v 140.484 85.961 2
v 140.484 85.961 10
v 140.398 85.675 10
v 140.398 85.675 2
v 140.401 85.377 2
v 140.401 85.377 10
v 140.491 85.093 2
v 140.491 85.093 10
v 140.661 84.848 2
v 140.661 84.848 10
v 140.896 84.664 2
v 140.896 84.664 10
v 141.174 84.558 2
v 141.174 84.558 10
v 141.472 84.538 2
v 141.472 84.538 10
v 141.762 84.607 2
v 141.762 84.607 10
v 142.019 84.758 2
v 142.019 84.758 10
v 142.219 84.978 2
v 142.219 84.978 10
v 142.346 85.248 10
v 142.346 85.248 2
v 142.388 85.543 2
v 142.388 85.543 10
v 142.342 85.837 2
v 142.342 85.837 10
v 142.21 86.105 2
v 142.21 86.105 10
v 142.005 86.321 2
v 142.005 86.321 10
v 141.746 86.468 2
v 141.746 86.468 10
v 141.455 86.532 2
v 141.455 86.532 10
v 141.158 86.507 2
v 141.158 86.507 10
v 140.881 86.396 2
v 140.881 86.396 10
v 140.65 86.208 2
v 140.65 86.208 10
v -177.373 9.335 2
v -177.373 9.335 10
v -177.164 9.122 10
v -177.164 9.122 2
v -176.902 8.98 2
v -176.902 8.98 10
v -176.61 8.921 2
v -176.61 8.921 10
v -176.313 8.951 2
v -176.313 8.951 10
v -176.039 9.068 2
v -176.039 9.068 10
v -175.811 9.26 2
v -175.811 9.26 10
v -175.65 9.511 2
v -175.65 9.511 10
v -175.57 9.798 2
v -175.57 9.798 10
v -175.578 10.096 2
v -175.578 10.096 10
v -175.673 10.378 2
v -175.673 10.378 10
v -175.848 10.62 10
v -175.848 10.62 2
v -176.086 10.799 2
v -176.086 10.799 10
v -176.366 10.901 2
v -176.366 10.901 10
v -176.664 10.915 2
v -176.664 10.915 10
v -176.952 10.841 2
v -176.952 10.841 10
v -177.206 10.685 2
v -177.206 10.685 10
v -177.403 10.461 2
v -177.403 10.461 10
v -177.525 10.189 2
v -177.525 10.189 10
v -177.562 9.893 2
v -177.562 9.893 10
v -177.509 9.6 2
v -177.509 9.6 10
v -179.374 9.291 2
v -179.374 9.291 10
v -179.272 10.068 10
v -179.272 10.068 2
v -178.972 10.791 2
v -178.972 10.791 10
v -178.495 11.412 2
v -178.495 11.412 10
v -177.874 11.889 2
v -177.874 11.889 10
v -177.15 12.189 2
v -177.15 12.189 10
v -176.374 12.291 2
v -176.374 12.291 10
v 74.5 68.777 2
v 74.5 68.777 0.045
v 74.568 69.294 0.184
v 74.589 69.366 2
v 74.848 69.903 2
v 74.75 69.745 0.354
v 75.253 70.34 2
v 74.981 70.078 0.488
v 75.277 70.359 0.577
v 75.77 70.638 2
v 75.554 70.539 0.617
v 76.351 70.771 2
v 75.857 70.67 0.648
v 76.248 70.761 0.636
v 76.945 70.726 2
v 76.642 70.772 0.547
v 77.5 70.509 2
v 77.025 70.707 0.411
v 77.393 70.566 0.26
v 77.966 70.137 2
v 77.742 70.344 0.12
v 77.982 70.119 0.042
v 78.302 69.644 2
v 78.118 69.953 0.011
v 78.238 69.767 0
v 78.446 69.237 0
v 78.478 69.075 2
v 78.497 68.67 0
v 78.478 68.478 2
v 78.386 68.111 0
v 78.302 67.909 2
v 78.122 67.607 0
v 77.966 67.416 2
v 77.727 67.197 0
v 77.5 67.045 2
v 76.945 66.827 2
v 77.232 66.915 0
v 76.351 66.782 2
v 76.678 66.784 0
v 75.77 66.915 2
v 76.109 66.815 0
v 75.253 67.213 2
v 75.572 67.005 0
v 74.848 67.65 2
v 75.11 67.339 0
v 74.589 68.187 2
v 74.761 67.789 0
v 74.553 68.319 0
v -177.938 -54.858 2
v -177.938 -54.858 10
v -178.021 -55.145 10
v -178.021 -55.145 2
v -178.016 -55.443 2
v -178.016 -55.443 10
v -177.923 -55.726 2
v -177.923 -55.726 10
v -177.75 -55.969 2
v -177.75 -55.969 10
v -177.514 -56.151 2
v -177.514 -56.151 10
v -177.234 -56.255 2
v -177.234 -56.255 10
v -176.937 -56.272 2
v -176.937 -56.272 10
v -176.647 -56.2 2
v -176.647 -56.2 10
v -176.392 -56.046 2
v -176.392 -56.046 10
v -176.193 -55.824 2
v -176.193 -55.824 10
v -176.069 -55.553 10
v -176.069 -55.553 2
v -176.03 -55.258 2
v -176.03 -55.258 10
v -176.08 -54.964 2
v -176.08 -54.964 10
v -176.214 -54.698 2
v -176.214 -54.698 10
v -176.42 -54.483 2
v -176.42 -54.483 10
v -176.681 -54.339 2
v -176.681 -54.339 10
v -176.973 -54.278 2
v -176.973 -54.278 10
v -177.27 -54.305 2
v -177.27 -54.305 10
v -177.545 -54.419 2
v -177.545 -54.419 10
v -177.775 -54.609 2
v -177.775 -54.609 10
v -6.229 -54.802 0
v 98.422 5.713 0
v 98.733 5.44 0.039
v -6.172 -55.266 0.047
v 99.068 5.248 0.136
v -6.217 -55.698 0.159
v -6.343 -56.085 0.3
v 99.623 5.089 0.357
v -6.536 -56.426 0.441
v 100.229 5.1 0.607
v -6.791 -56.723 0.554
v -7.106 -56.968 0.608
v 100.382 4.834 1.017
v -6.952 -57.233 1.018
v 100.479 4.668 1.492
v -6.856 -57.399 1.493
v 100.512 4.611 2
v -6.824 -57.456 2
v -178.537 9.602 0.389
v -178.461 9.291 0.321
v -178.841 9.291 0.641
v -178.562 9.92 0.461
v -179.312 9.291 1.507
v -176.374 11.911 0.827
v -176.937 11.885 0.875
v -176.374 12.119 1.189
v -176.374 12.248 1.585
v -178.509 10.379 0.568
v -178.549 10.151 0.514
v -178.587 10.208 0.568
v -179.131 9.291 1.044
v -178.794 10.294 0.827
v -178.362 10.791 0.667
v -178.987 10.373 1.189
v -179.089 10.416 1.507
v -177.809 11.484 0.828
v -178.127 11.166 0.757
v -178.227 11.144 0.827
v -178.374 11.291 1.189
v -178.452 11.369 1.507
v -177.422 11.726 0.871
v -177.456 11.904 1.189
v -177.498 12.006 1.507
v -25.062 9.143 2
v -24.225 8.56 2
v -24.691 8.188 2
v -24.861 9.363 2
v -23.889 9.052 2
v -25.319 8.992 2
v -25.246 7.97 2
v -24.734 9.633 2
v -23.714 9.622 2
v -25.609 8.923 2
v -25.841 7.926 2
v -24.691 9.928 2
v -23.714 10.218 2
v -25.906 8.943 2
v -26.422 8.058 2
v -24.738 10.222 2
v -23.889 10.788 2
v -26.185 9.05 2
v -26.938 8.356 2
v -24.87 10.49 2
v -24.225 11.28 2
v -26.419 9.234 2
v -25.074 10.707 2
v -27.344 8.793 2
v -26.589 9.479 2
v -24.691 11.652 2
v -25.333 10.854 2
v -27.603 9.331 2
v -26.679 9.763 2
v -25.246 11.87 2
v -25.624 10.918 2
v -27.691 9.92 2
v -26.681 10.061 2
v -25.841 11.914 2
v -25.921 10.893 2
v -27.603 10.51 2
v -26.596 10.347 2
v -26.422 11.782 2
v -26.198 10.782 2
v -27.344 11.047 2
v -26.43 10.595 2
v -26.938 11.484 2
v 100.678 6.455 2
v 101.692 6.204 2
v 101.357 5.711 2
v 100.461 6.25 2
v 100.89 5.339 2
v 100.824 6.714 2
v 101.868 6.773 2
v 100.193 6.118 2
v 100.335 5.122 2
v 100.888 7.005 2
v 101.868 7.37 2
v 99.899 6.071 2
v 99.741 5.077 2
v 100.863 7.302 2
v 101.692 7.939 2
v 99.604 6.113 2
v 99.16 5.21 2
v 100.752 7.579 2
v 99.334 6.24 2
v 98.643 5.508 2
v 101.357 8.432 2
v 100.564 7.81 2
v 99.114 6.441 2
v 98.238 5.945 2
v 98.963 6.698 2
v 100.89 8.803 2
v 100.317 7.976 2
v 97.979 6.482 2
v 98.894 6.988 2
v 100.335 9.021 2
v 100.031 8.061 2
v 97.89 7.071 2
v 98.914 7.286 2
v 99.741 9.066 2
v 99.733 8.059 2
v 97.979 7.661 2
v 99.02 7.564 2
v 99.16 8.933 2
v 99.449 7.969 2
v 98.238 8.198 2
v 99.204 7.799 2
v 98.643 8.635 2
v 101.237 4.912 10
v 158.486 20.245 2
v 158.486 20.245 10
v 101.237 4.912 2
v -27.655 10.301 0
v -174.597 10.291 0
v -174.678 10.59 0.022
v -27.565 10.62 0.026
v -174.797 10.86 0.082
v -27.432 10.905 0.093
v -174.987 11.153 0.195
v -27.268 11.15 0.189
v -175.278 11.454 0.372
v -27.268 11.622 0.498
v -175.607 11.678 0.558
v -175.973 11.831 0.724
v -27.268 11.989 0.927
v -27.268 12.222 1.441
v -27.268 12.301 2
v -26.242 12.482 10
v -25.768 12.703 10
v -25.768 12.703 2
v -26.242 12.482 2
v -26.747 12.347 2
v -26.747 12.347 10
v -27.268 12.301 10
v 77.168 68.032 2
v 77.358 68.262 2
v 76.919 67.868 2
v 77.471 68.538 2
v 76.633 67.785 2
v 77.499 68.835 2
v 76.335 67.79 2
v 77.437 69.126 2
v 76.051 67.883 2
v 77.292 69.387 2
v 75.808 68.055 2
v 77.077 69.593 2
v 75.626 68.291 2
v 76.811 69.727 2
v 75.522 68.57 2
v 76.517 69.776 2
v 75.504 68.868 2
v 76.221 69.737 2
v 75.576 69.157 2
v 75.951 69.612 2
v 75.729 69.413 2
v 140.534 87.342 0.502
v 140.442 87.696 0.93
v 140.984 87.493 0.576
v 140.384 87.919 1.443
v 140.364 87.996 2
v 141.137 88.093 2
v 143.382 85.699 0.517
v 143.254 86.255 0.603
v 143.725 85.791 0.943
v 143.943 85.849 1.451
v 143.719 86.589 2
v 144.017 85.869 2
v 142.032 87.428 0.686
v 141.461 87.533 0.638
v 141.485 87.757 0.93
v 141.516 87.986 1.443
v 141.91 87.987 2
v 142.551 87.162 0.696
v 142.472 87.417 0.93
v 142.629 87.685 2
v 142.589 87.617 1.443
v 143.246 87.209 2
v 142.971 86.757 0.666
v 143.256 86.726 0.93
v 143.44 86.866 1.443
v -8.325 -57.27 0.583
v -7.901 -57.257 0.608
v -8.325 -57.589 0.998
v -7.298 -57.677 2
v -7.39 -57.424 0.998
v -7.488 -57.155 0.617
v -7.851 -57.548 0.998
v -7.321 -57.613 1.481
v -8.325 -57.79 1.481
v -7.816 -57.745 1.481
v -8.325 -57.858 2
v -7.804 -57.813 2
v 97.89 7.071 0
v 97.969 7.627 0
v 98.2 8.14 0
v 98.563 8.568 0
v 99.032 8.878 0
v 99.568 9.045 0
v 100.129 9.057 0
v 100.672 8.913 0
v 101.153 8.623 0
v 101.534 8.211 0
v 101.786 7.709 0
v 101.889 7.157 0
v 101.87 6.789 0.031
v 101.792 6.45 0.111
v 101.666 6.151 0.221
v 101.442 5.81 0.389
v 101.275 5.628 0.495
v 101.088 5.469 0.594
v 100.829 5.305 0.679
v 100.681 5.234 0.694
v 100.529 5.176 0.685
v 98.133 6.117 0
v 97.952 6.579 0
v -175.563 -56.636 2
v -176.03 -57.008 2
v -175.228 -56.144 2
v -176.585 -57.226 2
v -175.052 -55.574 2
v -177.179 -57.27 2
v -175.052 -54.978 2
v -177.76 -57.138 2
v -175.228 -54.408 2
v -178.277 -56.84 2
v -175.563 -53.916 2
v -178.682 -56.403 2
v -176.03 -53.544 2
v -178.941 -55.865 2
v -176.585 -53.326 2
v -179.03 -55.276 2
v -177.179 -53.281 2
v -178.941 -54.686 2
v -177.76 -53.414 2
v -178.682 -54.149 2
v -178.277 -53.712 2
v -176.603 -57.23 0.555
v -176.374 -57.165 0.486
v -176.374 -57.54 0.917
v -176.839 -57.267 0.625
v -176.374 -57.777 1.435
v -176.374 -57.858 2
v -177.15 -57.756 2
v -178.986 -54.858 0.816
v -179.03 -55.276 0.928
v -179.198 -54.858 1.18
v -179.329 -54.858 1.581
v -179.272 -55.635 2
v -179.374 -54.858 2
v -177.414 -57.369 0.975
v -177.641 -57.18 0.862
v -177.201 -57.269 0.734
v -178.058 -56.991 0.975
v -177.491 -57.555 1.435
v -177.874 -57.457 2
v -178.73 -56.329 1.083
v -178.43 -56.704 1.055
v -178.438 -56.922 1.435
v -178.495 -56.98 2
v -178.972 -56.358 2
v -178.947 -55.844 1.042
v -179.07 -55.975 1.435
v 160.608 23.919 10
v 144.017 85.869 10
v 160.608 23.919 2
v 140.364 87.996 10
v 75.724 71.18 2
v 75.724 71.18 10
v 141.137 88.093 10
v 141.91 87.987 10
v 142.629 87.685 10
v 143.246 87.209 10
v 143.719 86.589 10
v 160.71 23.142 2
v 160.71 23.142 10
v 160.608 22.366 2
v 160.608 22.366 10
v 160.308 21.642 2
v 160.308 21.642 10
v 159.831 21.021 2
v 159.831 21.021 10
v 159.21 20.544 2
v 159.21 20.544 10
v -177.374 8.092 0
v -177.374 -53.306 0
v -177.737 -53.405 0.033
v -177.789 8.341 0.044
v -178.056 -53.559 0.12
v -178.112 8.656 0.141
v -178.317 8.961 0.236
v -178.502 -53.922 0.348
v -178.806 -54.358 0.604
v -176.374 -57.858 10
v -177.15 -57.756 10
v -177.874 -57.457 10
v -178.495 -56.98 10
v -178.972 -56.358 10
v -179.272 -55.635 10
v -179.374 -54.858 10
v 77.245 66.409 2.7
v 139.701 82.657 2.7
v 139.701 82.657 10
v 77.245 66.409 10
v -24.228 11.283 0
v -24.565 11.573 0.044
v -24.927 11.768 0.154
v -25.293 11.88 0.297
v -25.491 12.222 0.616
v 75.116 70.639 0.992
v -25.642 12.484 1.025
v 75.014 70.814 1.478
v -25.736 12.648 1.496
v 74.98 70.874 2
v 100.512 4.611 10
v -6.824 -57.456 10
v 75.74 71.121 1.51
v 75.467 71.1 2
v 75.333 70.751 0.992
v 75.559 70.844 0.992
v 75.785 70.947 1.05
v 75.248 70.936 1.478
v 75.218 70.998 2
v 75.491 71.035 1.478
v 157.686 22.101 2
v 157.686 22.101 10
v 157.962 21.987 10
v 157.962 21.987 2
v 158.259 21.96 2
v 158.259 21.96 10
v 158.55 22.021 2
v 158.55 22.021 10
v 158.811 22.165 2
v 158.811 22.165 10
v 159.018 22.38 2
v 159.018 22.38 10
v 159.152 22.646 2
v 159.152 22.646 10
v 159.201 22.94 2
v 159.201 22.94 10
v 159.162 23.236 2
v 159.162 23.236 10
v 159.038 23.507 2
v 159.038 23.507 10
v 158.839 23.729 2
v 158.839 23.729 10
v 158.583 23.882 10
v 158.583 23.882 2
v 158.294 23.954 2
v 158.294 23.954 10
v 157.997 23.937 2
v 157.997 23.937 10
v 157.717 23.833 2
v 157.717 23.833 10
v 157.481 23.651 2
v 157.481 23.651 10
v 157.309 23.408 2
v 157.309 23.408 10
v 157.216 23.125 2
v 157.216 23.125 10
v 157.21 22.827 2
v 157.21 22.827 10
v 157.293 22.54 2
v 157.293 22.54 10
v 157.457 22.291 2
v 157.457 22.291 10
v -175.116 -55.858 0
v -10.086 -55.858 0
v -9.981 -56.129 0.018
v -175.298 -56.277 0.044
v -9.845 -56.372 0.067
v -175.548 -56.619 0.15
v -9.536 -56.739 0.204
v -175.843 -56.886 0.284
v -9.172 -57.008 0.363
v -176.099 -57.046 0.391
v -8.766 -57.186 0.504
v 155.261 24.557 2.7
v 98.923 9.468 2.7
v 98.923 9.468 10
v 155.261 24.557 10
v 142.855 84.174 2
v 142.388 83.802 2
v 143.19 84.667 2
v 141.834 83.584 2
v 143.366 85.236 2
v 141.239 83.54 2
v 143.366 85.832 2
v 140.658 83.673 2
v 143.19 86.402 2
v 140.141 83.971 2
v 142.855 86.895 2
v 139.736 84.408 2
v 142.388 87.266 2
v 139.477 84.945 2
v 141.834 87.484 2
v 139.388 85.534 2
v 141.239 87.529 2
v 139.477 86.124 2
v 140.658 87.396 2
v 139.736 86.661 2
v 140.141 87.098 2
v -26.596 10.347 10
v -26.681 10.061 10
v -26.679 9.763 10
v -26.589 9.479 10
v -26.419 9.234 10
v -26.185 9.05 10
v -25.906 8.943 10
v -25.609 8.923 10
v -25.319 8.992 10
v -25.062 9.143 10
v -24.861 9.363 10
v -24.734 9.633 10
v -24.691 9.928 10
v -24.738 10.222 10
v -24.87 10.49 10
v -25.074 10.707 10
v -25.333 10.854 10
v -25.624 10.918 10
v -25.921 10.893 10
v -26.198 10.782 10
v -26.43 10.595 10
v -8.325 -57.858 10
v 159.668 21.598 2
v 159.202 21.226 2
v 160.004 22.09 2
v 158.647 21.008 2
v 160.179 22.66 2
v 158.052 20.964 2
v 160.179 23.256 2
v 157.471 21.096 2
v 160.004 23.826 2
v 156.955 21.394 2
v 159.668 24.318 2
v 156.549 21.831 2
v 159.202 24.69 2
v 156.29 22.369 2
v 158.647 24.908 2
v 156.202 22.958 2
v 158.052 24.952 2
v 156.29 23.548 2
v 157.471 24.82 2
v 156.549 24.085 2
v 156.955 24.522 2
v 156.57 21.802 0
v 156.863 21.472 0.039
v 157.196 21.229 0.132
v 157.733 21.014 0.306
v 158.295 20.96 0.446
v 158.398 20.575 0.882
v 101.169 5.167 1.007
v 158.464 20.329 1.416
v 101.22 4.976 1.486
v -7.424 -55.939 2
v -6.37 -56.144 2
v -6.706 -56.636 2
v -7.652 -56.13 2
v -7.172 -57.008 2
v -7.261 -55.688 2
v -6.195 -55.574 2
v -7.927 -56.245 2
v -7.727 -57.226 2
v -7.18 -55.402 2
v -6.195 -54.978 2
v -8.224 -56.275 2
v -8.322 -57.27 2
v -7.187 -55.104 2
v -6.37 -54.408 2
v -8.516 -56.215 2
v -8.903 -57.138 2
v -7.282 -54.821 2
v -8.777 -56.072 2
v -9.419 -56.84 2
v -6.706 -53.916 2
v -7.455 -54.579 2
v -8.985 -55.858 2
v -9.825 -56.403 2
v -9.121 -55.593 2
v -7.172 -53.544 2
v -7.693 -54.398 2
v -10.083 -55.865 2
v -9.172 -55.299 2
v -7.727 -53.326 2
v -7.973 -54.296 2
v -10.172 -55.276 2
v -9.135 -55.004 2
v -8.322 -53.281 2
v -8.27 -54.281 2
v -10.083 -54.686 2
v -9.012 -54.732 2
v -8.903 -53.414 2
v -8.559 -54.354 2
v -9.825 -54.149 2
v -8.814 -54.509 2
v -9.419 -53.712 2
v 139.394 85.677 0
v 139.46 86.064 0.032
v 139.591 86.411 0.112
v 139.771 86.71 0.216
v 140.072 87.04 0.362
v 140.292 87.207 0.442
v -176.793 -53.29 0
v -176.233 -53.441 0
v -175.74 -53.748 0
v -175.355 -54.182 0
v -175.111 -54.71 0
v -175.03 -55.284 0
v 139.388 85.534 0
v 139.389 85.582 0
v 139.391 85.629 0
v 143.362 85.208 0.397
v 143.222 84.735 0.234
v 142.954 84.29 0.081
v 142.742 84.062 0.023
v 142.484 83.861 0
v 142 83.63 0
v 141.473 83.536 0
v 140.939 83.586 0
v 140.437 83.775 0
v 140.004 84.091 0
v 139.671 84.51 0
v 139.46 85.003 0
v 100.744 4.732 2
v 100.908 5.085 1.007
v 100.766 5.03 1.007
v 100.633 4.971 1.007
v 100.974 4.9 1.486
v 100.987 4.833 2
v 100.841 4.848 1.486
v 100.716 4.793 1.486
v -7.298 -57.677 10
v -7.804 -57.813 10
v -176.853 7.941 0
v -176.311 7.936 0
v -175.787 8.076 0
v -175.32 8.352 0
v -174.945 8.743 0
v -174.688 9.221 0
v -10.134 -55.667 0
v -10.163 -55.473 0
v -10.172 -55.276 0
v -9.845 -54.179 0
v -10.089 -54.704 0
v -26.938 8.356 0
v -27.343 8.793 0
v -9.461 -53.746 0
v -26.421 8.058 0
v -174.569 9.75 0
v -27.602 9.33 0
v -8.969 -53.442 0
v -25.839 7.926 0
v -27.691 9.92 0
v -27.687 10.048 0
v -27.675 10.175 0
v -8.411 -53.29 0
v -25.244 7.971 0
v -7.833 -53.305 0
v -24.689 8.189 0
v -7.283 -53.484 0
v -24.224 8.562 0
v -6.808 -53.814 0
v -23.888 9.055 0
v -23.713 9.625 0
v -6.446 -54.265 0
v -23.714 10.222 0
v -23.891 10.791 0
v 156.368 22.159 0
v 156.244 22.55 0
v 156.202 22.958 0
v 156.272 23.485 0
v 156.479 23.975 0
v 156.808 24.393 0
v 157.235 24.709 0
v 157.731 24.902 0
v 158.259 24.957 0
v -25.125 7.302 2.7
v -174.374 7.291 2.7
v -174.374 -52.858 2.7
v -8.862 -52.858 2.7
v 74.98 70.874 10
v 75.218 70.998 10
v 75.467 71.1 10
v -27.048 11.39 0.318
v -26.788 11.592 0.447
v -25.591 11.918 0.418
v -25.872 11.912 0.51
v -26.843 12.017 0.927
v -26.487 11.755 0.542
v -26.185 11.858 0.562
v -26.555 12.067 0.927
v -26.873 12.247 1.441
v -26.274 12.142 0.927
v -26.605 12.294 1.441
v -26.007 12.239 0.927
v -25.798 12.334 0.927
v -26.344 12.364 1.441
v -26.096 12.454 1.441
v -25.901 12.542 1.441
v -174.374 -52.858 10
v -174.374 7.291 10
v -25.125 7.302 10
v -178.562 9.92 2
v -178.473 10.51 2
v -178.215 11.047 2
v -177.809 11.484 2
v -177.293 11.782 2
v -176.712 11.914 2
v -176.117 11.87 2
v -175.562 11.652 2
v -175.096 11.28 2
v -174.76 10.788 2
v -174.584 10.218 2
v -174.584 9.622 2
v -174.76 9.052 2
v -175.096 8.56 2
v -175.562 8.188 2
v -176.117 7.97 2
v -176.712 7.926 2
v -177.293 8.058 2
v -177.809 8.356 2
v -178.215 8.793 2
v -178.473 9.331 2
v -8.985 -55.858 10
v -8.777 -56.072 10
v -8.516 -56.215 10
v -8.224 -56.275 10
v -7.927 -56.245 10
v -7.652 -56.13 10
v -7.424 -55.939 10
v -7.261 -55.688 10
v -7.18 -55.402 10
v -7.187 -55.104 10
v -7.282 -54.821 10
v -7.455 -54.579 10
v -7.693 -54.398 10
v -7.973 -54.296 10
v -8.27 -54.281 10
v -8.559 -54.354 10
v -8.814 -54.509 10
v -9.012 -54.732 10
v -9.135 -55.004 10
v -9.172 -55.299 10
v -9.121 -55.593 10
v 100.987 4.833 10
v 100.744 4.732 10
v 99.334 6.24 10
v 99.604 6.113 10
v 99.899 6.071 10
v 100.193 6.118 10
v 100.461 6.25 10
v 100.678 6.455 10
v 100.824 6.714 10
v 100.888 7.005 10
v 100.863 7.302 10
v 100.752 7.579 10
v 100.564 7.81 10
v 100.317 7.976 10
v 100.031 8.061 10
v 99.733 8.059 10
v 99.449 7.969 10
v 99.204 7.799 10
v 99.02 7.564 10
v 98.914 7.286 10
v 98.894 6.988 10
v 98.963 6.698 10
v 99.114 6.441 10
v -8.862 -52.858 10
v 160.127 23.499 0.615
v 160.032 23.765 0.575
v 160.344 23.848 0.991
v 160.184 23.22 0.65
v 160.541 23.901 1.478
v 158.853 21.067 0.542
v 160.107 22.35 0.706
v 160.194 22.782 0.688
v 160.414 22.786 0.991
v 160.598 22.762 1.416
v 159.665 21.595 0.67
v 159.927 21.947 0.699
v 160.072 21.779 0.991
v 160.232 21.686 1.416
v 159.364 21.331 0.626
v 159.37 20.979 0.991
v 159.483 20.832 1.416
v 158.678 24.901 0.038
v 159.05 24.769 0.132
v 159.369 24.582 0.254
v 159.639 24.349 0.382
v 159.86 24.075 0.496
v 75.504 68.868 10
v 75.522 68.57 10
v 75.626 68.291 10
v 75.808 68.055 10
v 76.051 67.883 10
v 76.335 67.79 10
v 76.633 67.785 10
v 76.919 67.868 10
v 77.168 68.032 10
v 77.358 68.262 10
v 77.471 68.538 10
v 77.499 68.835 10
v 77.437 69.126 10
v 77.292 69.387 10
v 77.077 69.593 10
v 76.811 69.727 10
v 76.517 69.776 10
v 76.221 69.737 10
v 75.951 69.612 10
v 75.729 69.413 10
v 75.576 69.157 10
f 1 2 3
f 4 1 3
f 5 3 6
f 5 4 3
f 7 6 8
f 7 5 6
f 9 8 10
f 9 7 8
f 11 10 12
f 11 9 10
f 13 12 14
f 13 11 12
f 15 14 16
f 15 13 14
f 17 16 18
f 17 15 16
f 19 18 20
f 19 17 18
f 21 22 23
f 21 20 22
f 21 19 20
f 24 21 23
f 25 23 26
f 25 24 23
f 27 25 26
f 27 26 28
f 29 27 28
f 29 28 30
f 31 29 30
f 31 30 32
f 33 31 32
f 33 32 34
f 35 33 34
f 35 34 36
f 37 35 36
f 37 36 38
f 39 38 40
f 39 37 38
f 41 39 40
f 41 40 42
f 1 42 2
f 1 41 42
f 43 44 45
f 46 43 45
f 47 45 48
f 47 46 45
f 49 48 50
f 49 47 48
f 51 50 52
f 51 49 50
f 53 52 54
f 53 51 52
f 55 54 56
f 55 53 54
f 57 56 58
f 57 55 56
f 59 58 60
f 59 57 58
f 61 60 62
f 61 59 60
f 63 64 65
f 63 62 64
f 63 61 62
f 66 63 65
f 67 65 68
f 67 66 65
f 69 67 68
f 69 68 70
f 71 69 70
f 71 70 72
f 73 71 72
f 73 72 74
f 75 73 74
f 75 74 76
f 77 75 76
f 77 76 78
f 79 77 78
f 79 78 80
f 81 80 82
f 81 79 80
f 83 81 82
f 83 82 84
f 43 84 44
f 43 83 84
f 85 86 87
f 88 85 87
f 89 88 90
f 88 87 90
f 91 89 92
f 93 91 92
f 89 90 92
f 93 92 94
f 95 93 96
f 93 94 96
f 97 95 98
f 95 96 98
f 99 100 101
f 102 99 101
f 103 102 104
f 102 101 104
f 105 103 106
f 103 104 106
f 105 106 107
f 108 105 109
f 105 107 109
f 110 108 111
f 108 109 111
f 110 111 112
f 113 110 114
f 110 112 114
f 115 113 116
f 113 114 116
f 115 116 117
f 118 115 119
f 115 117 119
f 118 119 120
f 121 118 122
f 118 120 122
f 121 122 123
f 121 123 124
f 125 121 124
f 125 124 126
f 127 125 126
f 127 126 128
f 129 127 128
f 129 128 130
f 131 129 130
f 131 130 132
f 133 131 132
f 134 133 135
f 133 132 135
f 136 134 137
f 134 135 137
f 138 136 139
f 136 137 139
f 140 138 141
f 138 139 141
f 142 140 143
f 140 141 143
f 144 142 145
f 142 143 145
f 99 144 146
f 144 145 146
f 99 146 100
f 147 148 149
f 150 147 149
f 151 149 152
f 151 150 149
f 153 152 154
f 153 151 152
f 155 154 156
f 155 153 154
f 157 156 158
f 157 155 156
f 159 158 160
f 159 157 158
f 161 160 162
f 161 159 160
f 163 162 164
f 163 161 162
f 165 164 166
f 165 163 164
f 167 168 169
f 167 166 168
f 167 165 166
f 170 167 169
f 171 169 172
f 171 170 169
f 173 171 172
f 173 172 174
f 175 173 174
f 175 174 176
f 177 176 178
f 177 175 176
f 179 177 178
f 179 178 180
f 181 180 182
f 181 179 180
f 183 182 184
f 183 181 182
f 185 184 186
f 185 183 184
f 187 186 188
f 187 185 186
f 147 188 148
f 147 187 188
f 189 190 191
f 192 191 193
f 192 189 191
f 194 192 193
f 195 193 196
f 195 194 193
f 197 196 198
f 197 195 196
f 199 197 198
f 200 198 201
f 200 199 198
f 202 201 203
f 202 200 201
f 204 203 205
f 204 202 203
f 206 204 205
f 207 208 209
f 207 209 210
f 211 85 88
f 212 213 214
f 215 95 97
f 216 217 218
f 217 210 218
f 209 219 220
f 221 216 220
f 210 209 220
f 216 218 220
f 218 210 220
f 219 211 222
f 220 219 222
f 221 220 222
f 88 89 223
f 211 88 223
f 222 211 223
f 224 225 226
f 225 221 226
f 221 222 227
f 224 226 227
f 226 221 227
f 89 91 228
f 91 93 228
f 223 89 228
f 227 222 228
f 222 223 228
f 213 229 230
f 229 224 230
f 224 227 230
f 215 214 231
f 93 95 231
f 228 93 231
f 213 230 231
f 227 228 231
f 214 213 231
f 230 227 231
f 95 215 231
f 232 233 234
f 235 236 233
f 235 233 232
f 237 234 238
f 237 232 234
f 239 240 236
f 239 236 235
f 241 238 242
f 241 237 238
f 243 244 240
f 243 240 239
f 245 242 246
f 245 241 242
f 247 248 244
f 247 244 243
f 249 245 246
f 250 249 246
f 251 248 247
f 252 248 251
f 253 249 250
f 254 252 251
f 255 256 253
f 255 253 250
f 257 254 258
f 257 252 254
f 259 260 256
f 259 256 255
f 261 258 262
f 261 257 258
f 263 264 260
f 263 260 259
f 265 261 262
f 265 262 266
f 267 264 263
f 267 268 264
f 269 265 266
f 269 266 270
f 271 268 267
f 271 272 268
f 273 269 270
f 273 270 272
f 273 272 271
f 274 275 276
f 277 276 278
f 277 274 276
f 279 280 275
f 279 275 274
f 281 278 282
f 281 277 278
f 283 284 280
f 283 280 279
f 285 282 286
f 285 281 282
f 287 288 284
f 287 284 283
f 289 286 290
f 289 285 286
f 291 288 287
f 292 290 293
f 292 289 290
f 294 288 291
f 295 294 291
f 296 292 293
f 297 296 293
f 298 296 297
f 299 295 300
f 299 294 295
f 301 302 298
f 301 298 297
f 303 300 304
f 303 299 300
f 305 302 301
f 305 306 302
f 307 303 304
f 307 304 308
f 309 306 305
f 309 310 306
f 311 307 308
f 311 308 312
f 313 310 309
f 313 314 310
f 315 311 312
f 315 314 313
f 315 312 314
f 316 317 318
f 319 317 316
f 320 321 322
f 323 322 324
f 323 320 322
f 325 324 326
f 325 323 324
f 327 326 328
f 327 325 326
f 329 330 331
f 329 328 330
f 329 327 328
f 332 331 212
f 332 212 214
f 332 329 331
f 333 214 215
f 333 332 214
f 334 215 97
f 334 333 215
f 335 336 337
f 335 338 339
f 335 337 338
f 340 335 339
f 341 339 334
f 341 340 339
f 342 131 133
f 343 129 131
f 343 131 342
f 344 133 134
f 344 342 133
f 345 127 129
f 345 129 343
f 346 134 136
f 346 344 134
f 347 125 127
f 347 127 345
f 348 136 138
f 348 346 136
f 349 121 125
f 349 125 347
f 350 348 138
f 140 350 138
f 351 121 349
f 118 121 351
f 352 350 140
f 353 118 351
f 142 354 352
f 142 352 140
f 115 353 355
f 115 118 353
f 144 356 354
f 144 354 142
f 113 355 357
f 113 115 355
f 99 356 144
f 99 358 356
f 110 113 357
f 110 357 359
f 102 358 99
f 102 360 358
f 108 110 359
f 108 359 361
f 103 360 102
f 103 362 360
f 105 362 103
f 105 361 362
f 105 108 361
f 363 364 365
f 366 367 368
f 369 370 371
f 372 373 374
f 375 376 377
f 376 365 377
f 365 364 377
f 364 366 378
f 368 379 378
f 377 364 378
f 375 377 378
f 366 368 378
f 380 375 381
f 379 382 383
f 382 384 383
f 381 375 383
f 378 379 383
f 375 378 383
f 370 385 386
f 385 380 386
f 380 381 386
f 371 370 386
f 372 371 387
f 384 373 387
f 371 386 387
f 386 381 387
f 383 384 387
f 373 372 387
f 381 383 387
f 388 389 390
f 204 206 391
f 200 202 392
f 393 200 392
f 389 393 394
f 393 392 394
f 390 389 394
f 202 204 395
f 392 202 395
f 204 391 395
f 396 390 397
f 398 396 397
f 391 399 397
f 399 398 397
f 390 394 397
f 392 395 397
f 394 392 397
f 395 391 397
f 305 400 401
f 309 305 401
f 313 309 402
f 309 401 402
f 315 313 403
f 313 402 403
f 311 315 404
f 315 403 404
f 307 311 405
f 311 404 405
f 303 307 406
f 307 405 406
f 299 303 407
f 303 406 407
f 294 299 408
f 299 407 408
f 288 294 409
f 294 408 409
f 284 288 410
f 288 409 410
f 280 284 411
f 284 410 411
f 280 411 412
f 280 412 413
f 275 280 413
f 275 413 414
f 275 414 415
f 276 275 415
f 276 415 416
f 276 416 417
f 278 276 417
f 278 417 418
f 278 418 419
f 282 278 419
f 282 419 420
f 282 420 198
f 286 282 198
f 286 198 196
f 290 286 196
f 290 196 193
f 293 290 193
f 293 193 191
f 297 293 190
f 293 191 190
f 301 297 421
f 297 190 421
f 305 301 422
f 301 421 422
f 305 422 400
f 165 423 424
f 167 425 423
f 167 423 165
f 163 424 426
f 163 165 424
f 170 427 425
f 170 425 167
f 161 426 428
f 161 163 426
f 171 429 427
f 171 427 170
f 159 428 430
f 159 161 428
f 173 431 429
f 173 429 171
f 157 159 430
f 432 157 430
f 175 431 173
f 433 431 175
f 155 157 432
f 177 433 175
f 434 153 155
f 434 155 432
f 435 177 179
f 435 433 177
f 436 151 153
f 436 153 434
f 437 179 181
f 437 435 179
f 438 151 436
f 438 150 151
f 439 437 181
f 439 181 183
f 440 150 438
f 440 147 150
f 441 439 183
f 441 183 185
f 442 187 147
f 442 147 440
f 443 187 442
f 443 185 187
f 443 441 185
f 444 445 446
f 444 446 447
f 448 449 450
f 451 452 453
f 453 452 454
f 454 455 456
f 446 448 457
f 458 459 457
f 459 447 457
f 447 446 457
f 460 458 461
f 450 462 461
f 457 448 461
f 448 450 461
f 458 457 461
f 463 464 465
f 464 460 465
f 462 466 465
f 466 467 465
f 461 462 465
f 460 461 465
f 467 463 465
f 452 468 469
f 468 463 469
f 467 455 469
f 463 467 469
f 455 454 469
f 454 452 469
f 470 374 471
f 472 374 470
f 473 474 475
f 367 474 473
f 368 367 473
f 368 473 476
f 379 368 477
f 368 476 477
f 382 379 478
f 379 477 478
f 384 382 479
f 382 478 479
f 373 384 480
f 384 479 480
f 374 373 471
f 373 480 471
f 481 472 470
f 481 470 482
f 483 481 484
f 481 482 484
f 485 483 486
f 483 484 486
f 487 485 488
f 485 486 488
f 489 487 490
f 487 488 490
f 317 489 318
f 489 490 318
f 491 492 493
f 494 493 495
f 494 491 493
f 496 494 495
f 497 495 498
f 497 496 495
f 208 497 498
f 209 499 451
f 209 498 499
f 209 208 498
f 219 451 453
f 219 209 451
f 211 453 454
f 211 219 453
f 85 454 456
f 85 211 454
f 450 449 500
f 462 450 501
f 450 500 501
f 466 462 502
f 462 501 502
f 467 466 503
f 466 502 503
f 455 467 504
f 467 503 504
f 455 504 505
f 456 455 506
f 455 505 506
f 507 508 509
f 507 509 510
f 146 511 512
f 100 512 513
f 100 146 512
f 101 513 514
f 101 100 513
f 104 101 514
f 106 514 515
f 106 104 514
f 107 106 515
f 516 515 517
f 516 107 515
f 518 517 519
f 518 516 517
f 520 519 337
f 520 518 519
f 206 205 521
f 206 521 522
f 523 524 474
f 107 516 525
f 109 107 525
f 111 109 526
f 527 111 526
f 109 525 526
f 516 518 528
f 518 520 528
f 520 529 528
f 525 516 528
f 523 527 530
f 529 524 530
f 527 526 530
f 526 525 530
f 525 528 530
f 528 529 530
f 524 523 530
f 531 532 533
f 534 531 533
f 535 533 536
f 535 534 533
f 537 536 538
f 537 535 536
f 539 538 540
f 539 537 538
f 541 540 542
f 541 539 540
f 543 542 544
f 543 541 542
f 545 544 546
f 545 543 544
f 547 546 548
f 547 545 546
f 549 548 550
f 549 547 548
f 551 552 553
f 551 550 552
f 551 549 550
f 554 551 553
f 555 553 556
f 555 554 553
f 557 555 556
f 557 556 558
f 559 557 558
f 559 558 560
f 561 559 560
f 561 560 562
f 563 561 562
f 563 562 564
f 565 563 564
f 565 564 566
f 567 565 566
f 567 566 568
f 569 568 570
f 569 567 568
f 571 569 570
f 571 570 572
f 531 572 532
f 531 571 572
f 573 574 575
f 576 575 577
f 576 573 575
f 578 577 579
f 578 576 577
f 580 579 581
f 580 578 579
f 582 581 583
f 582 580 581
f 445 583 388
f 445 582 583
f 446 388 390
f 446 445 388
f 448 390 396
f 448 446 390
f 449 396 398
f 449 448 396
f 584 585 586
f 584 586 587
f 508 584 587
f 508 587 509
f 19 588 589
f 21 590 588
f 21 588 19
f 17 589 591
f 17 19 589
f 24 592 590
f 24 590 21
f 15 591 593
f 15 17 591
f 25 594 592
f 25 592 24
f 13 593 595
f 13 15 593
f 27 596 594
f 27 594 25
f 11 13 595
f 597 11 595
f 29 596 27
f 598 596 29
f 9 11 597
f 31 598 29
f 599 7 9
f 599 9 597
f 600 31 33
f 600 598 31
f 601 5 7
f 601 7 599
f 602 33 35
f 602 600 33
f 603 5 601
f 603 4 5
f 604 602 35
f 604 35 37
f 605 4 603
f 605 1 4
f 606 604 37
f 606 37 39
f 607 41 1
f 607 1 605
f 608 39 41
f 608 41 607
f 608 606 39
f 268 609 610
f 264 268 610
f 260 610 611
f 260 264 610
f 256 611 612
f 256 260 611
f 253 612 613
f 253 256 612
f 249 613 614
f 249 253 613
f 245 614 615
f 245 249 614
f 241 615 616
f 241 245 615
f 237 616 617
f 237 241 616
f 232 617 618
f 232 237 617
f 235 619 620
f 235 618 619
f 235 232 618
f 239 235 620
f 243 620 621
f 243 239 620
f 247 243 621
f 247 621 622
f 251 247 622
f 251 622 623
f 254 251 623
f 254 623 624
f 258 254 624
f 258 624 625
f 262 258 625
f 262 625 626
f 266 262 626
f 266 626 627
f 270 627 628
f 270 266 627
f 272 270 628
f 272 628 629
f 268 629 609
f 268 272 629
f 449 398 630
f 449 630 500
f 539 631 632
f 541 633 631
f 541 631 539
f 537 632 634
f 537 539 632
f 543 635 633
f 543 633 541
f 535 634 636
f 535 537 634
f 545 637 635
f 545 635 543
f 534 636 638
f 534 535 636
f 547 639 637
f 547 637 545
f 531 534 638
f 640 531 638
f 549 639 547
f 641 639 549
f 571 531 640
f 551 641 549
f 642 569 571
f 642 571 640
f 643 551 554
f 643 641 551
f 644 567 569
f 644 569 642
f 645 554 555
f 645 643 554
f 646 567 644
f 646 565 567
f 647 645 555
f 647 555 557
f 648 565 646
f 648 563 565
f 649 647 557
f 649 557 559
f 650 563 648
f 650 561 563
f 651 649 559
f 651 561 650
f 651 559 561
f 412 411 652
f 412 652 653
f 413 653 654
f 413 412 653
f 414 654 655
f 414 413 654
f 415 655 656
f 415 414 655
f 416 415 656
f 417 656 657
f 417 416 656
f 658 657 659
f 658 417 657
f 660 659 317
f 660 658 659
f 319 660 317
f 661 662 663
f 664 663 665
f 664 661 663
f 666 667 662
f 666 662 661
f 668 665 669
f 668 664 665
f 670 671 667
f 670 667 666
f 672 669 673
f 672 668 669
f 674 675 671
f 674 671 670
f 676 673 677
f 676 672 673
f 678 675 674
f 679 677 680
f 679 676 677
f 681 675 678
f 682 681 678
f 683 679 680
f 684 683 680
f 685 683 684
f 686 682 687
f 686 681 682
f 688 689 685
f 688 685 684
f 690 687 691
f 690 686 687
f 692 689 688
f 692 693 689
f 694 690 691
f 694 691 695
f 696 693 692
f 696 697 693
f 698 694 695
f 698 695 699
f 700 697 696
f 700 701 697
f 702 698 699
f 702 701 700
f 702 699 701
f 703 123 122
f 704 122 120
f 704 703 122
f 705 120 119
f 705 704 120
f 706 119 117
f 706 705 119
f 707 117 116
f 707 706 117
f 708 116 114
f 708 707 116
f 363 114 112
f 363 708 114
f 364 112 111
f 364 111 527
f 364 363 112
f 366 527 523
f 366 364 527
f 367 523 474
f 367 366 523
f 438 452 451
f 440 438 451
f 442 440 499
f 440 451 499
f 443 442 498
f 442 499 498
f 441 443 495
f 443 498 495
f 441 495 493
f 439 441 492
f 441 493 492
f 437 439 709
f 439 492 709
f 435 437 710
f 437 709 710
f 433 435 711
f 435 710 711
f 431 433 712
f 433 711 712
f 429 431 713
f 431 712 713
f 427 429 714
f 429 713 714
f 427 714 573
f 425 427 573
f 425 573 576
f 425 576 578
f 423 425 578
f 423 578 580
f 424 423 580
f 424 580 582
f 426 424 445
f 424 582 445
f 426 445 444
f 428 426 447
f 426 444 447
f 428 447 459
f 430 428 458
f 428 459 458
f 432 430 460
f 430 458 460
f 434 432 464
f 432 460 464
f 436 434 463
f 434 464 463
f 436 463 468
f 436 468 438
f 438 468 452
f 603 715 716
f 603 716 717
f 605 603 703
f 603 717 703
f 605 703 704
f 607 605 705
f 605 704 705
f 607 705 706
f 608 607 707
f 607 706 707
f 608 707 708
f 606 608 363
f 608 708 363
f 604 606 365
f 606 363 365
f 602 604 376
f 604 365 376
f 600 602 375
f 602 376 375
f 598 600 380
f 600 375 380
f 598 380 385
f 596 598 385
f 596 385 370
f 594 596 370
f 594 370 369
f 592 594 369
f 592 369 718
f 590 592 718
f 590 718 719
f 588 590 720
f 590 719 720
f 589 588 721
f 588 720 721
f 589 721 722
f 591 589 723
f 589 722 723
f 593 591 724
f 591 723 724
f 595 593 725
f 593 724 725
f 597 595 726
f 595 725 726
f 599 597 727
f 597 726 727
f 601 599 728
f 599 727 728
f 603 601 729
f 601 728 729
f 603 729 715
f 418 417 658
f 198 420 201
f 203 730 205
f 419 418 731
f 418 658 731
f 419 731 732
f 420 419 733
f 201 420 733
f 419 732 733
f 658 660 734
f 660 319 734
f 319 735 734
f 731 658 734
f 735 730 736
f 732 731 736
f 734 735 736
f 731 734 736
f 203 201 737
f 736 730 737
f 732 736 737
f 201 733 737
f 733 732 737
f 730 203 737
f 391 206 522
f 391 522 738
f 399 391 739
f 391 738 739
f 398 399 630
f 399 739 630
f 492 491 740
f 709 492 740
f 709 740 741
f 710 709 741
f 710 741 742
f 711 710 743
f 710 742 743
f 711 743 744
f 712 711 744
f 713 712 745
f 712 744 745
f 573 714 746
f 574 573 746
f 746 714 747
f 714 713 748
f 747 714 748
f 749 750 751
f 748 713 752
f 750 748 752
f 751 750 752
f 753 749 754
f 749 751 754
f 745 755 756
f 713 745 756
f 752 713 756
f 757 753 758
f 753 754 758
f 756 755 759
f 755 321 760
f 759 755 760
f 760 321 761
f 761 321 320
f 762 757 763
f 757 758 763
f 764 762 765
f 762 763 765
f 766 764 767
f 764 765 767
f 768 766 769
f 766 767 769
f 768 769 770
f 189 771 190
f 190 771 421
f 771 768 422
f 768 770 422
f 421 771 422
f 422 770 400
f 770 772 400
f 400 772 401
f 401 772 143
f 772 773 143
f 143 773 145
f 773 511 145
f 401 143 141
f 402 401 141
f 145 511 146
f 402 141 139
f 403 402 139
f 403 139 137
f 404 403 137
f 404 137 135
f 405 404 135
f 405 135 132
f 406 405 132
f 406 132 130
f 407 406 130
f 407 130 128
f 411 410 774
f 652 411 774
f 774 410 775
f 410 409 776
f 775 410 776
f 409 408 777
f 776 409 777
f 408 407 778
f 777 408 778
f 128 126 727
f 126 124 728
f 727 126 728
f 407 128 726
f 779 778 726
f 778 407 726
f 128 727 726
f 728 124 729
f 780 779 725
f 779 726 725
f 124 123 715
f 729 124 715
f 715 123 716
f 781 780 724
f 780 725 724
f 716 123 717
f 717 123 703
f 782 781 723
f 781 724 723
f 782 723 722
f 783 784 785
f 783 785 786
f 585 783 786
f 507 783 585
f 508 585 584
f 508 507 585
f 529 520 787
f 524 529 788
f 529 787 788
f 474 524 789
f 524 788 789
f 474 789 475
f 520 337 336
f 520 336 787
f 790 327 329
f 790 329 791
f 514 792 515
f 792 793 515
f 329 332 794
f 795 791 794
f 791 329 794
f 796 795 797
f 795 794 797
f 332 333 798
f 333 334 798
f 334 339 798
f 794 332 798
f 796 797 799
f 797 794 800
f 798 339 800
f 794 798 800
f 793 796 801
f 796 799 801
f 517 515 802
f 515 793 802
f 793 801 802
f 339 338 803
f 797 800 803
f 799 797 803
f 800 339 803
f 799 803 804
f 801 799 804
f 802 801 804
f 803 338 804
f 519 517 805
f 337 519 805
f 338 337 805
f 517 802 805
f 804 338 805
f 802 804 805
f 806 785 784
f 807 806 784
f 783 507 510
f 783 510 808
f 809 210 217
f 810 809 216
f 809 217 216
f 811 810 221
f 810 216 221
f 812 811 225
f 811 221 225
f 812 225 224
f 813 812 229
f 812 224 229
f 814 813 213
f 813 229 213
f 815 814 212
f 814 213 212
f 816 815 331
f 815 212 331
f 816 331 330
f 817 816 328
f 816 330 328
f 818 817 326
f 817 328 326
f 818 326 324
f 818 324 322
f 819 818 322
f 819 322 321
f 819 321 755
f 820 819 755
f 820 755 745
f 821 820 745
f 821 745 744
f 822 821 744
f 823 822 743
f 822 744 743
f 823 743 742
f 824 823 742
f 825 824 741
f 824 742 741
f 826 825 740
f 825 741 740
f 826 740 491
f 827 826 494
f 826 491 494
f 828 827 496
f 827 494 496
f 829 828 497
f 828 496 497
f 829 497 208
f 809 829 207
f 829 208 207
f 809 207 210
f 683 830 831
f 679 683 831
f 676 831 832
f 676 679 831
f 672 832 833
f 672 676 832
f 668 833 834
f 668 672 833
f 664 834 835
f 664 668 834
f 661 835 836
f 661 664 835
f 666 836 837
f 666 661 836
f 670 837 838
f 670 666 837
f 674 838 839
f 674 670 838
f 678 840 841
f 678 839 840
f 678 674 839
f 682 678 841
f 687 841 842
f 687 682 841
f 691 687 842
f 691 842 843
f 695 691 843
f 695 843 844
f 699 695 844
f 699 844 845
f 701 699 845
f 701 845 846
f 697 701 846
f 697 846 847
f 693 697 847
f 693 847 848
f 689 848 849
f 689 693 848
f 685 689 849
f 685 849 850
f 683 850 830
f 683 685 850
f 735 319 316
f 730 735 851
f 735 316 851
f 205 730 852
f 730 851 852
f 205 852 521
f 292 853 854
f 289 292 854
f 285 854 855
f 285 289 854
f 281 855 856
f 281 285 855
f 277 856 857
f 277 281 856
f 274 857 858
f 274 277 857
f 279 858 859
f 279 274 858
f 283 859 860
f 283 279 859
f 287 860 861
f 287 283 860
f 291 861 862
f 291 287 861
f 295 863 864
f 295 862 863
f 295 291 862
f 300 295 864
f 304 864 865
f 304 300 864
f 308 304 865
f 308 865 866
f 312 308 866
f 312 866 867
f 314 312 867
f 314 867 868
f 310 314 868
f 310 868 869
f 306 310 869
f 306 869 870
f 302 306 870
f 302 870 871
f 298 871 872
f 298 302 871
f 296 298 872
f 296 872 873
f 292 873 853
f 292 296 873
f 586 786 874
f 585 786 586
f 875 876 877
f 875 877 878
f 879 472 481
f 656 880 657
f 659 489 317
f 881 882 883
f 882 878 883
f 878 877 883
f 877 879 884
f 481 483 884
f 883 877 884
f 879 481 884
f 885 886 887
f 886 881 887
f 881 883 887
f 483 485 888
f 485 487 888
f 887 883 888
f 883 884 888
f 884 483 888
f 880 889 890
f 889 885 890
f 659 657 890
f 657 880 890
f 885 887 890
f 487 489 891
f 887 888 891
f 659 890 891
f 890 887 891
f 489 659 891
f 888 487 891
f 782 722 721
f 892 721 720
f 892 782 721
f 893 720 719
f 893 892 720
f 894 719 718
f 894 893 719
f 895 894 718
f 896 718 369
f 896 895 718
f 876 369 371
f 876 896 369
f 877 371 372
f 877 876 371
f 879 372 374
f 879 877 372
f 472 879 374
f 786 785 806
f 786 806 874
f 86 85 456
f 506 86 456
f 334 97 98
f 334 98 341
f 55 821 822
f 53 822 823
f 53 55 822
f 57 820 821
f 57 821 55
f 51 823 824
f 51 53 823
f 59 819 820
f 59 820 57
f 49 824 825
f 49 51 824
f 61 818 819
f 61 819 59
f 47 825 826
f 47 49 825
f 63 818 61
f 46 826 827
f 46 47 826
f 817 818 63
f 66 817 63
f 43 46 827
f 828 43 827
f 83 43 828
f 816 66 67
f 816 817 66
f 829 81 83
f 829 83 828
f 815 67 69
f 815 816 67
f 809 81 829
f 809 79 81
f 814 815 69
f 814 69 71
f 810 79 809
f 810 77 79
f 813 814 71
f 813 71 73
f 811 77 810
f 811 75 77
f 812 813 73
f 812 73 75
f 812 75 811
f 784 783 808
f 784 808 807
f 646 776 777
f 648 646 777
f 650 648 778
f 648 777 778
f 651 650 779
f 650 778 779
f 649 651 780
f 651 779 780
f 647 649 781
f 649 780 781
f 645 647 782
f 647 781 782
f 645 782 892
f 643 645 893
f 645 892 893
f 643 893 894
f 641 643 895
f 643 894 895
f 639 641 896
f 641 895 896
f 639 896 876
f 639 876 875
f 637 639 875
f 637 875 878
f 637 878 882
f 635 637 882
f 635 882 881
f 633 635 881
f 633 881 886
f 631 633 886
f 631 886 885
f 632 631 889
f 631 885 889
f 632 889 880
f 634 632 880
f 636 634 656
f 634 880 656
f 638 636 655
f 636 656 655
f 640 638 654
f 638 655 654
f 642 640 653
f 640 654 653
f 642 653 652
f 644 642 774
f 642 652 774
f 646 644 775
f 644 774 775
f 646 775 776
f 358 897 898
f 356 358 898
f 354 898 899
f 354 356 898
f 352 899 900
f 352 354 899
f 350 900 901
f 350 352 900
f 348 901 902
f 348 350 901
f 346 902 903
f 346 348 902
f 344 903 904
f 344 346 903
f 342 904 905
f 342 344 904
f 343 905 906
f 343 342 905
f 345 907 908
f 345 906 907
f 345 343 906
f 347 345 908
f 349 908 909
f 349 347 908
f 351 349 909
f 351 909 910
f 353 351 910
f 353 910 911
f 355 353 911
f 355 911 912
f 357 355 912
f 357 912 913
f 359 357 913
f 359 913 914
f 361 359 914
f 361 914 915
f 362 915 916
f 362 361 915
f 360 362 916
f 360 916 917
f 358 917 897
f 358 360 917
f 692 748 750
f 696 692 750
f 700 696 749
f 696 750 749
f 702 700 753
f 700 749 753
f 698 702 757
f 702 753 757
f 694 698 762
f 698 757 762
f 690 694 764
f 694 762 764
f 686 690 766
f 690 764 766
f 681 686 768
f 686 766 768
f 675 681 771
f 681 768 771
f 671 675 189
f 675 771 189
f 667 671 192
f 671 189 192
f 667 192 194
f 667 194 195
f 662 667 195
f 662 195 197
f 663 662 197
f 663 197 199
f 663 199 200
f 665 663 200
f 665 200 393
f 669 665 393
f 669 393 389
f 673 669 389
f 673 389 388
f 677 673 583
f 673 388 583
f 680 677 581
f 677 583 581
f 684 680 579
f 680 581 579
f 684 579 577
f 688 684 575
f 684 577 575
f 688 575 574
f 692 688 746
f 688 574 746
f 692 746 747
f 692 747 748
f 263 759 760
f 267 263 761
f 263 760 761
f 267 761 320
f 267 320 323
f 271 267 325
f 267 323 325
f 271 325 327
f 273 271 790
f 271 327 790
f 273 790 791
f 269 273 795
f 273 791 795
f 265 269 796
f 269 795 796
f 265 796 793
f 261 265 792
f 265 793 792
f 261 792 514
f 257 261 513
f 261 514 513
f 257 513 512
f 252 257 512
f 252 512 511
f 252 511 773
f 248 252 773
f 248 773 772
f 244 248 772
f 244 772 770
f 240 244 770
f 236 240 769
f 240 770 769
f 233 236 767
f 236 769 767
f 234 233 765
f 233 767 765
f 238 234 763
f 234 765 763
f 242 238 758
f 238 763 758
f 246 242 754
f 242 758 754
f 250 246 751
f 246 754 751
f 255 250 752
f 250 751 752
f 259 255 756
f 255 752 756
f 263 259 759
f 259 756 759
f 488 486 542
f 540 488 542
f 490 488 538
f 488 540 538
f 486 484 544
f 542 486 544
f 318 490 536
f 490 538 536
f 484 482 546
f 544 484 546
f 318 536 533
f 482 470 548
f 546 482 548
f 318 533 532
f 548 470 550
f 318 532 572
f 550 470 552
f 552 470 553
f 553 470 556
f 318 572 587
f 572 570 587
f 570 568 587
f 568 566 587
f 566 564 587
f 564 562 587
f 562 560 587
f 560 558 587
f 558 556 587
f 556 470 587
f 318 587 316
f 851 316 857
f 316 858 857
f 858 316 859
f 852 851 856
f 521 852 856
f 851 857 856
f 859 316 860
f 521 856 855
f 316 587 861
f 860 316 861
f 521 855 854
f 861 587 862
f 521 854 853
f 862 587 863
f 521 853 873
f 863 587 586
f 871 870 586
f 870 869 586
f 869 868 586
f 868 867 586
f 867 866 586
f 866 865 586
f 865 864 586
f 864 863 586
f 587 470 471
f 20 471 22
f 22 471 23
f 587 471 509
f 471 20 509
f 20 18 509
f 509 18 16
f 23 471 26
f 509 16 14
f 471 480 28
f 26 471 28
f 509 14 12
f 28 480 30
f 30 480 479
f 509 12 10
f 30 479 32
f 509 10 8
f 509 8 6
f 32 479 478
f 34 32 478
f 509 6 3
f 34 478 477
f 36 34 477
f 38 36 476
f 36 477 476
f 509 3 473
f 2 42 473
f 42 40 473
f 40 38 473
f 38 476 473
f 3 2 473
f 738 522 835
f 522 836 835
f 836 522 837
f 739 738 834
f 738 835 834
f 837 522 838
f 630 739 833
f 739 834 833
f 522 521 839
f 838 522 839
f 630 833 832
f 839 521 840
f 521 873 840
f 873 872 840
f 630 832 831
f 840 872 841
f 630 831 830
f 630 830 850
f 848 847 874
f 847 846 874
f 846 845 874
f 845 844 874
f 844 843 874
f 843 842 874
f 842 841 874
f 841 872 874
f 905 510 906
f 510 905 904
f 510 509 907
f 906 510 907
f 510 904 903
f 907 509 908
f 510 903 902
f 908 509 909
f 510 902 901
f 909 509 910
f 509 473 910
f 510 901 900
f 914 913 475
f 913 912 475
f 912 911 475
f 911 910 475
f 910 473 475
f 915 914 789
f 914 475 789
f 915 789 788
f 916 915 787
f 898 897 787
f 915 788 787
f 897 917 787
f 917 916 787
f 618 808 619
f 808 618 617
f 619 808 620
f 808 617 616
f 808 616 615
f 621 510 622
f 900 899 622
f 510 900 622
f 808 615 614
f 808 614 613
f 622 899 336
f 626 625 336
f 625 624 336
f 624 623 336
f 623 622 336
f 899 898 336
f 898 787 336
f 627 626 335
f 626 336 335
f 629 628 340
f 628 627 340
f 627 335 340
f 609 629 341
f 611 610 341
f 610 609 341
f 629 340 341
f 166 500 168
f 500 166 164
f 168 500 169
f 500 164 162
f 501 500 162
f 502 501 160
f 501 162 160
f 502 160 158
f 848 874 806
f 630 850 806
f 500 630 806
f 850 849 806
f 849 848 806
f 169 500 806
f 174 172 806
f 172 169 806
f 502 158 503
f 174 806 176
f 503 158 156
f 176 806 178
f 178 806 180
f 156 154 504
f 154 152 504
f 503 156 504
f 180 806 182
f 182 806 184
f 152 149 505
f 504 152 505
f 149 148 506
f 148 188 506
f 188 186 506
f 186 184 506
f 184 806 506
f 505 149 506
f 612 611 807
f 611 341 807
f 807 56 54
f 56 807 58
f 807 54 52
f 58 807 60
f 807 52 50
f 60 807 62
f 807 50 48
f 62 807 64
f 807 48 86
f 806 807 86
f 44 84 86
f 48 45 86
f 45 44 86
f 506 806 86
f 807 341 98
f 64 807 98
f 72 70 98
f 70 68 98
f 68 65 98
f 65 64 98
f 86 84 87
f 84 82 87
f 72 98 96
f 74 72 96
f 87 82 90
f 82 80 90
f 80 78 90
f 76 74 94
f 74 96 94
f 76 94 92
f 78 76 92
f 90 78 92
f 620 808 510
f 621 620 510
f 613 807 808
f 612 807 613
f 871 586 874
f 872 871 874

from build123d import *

# Parameters (mm, degrees)
BOSS_EXTRU_1_DEPTH      = 10
CONG_1_R                = 3
BOSS_EXTRU_2_DEPTH      = 2.7
CONG_2_R                = 2
ESQUISSE3_R             = 1
ENL_V_MAT_EXTRU_1_DEPTH = 20
ESQUISSE4_R             = 2
ENL_V_MAT_EXTRU_2_DEPTH = 2


with BuildPart() as part:
    # Model → Boss.-Extru.1 (new body)
    with BuildSketch(Plane.XY):
        Polygon((-26.464533767, 12.30154537), (75.33141454, 71.077500491), (143.246352653, 88.745859712), (161.383942986, 21.020985262), (100.854480283, 4.809102496), (-7.520422715, -57.858487698), (-179.373873722, -57.858487698), (-179.373873722, -50.687645053), (-179.373873722, 12.291034855), align=None)
        Polygon((-25.124548608, 7.301637465), (-174.373873722, 7.291378528), (-174.373873722, -50.687645053), (-174.373873722, -52.858487698), (-8.861972593, -52.858487698), (98.923133978, 9.468053786), (155.26069475, 24.557200291), (139.700811798, 82.657041562), (77.245358051, 66.408990356), align=None, mode=Mode.SUBTRACT)
    extrude(amount=BOSS_EXTRU_1_DEPTH)

    # Congé1
    cong_1_edges = [part.edges().sort_by_distance(p)[0] for p in [
        (75.33141454, 71.077500491, 5),
        (143.246352653, 88.745859712, 5),
        (161.383942986, 21.020985262, 5),
        (100.854480283, 4.809102496, 5),
        (-7.520422715, -57.858487698, 5),
        (-179.373873722, -57.858487698, 5),
        (-179.373873722, 12.291034855, 5),
        (-26.464533767, 12.30154537, 5),
    ]]
    fillet(cong_1_edges, radius=CONG_1_R)

    # Esquisse1 → Boss.-Extru.2 (add)
    with BuildSketch(Plane.XY):
        Polygon((-25.124548608, 7.301637465), (-174.373873722, 7.291378528), (-174.373873722, -50.687645053), (-174.373873722, -52.858487698), (-8.861972593, -52.858487698), (98.923133978, 9.468053786), (155.26069475, 24.557200291), (139.700811798, 82.657041562), (77.245358051, 66.408990356), align=None)
    extrude(amount=BOSS_EXTRU_2_DEPTH)

    # Congé2
    cong_2_edges = [part.edges().sort_by_distance(p)[0] for p in [
        (-101.821199292, 12.296365586, 0),
        (24.605627892, 41.788942262, 0),
        (108.044083383, 79.587840046, 0),
        (152.312387337, 54.893729991, 0),
        (129.861641055, 12.578223, 0),
        (46.843967712, -26.422377988, 0),
        (-92.349613182, -57.858487698, 0),
        (-179.373873722, -22.78362332, 0),
        (-178.495266971, 11.412488494, 0),
        (-178.495194066, -56.979808041, 0),
        (-7.547920203, -57.756003669, 0),
        (160.307894606, 21.642410085, 0),
        (142.628648998, 87.685066626, 0),
        (75.341794938, 71.05218052, 0),
        (-26.491925042, 12.40375087, 0),
        (100.86445313, 4.78504518, 0),
    ]]
    fillet(cong_2_edges, radius=CONG_2_R)

    # Esquisse3 → Enlèv. mat.-Extru.1 (cut)
    with BuildSketch(Plane.XY):
        with Locations(Location((158.201617013, 22.958080812, 0), (0, 0, 238.978237888))):
            Circle(ESQUISSE3_R)
        with Locations(Location((141.388472611, 85.534334234, 0), (0, 0, 154.767958728))):
            Circle(ESQUISSE3_R)
        with Locations(Location((76.500226548, 68.776582274, 0), (0, 0, 174.757995249))):
            Circle(ESQUISSE3_R)
        with Locations(Location((99.890442316, 7.071415488, 0), (0, 0, 236.208794577))):
            Circle(ESQUISSE3_R)
        with Locations(Location((-8.172352823, -55.275906246, 0), (0, 0, 215.632313771))):
            Circle(ESQUISSE3_R)
        with Locations(Location((-25.691359515, 9.920090126, 0), (0, 0, 154.730246838))):
            Circle(ESQUISSE3_R)
        with Locations(Location((-176.562127678, 9.920090126, 0), (0, 0, 215.825985053))):
            Circle(ESQUISSE3_R)
        with Locations(Location((-177.029598341, -55.275906246, 0), (0, 0, 155.328283389))):
            Circle(ESQUISSE3_R)
    extrude(amount=ENL_V_MAT_EXTRU_1_DEPTH, mode=Mode.SUBTRACT)

    # Esquisse4 → Enlèv. mat.-Extru.2 (cut)
    with BuildSketch(Plane(origin=(0, 0, 0), x_dir=(-1, 0, 0), z_dir=(0, 0, -1))):
        with Locations((177.029598341, -55.275906246)):
            Circle(ESQUISSE4_R)
        with Locations((176.562127678, 9.920090126)):
            Circle(ESQUISSE4_R)
        with Locations((25.691359515, 9.920090126)):
            Circle(ESQUISSE4_R)
        with Locations((-76.500226548, 68.776582274)):
            Circle(ESQUISSE4_R)
        with Locations((-141.388472611, 85.534334234)):
            Circle(ESQUISSE4_R)
        with Locations((-158.201617013, 22.958080812)):
            Circle(ESQUISSE4_R)
        with Locations((-99.890442316, 7.071415488)):
            Circle(ESQUISSE4_R)
        with Locations((8.172352823, -55.275906246)):
            Circle(ESQUISSE4_R)
    extrude(amount=-ENL_V_MAT_EXTRU_2_DEPTH, mode=Mode.SUBTRACT)


solid = part.part
